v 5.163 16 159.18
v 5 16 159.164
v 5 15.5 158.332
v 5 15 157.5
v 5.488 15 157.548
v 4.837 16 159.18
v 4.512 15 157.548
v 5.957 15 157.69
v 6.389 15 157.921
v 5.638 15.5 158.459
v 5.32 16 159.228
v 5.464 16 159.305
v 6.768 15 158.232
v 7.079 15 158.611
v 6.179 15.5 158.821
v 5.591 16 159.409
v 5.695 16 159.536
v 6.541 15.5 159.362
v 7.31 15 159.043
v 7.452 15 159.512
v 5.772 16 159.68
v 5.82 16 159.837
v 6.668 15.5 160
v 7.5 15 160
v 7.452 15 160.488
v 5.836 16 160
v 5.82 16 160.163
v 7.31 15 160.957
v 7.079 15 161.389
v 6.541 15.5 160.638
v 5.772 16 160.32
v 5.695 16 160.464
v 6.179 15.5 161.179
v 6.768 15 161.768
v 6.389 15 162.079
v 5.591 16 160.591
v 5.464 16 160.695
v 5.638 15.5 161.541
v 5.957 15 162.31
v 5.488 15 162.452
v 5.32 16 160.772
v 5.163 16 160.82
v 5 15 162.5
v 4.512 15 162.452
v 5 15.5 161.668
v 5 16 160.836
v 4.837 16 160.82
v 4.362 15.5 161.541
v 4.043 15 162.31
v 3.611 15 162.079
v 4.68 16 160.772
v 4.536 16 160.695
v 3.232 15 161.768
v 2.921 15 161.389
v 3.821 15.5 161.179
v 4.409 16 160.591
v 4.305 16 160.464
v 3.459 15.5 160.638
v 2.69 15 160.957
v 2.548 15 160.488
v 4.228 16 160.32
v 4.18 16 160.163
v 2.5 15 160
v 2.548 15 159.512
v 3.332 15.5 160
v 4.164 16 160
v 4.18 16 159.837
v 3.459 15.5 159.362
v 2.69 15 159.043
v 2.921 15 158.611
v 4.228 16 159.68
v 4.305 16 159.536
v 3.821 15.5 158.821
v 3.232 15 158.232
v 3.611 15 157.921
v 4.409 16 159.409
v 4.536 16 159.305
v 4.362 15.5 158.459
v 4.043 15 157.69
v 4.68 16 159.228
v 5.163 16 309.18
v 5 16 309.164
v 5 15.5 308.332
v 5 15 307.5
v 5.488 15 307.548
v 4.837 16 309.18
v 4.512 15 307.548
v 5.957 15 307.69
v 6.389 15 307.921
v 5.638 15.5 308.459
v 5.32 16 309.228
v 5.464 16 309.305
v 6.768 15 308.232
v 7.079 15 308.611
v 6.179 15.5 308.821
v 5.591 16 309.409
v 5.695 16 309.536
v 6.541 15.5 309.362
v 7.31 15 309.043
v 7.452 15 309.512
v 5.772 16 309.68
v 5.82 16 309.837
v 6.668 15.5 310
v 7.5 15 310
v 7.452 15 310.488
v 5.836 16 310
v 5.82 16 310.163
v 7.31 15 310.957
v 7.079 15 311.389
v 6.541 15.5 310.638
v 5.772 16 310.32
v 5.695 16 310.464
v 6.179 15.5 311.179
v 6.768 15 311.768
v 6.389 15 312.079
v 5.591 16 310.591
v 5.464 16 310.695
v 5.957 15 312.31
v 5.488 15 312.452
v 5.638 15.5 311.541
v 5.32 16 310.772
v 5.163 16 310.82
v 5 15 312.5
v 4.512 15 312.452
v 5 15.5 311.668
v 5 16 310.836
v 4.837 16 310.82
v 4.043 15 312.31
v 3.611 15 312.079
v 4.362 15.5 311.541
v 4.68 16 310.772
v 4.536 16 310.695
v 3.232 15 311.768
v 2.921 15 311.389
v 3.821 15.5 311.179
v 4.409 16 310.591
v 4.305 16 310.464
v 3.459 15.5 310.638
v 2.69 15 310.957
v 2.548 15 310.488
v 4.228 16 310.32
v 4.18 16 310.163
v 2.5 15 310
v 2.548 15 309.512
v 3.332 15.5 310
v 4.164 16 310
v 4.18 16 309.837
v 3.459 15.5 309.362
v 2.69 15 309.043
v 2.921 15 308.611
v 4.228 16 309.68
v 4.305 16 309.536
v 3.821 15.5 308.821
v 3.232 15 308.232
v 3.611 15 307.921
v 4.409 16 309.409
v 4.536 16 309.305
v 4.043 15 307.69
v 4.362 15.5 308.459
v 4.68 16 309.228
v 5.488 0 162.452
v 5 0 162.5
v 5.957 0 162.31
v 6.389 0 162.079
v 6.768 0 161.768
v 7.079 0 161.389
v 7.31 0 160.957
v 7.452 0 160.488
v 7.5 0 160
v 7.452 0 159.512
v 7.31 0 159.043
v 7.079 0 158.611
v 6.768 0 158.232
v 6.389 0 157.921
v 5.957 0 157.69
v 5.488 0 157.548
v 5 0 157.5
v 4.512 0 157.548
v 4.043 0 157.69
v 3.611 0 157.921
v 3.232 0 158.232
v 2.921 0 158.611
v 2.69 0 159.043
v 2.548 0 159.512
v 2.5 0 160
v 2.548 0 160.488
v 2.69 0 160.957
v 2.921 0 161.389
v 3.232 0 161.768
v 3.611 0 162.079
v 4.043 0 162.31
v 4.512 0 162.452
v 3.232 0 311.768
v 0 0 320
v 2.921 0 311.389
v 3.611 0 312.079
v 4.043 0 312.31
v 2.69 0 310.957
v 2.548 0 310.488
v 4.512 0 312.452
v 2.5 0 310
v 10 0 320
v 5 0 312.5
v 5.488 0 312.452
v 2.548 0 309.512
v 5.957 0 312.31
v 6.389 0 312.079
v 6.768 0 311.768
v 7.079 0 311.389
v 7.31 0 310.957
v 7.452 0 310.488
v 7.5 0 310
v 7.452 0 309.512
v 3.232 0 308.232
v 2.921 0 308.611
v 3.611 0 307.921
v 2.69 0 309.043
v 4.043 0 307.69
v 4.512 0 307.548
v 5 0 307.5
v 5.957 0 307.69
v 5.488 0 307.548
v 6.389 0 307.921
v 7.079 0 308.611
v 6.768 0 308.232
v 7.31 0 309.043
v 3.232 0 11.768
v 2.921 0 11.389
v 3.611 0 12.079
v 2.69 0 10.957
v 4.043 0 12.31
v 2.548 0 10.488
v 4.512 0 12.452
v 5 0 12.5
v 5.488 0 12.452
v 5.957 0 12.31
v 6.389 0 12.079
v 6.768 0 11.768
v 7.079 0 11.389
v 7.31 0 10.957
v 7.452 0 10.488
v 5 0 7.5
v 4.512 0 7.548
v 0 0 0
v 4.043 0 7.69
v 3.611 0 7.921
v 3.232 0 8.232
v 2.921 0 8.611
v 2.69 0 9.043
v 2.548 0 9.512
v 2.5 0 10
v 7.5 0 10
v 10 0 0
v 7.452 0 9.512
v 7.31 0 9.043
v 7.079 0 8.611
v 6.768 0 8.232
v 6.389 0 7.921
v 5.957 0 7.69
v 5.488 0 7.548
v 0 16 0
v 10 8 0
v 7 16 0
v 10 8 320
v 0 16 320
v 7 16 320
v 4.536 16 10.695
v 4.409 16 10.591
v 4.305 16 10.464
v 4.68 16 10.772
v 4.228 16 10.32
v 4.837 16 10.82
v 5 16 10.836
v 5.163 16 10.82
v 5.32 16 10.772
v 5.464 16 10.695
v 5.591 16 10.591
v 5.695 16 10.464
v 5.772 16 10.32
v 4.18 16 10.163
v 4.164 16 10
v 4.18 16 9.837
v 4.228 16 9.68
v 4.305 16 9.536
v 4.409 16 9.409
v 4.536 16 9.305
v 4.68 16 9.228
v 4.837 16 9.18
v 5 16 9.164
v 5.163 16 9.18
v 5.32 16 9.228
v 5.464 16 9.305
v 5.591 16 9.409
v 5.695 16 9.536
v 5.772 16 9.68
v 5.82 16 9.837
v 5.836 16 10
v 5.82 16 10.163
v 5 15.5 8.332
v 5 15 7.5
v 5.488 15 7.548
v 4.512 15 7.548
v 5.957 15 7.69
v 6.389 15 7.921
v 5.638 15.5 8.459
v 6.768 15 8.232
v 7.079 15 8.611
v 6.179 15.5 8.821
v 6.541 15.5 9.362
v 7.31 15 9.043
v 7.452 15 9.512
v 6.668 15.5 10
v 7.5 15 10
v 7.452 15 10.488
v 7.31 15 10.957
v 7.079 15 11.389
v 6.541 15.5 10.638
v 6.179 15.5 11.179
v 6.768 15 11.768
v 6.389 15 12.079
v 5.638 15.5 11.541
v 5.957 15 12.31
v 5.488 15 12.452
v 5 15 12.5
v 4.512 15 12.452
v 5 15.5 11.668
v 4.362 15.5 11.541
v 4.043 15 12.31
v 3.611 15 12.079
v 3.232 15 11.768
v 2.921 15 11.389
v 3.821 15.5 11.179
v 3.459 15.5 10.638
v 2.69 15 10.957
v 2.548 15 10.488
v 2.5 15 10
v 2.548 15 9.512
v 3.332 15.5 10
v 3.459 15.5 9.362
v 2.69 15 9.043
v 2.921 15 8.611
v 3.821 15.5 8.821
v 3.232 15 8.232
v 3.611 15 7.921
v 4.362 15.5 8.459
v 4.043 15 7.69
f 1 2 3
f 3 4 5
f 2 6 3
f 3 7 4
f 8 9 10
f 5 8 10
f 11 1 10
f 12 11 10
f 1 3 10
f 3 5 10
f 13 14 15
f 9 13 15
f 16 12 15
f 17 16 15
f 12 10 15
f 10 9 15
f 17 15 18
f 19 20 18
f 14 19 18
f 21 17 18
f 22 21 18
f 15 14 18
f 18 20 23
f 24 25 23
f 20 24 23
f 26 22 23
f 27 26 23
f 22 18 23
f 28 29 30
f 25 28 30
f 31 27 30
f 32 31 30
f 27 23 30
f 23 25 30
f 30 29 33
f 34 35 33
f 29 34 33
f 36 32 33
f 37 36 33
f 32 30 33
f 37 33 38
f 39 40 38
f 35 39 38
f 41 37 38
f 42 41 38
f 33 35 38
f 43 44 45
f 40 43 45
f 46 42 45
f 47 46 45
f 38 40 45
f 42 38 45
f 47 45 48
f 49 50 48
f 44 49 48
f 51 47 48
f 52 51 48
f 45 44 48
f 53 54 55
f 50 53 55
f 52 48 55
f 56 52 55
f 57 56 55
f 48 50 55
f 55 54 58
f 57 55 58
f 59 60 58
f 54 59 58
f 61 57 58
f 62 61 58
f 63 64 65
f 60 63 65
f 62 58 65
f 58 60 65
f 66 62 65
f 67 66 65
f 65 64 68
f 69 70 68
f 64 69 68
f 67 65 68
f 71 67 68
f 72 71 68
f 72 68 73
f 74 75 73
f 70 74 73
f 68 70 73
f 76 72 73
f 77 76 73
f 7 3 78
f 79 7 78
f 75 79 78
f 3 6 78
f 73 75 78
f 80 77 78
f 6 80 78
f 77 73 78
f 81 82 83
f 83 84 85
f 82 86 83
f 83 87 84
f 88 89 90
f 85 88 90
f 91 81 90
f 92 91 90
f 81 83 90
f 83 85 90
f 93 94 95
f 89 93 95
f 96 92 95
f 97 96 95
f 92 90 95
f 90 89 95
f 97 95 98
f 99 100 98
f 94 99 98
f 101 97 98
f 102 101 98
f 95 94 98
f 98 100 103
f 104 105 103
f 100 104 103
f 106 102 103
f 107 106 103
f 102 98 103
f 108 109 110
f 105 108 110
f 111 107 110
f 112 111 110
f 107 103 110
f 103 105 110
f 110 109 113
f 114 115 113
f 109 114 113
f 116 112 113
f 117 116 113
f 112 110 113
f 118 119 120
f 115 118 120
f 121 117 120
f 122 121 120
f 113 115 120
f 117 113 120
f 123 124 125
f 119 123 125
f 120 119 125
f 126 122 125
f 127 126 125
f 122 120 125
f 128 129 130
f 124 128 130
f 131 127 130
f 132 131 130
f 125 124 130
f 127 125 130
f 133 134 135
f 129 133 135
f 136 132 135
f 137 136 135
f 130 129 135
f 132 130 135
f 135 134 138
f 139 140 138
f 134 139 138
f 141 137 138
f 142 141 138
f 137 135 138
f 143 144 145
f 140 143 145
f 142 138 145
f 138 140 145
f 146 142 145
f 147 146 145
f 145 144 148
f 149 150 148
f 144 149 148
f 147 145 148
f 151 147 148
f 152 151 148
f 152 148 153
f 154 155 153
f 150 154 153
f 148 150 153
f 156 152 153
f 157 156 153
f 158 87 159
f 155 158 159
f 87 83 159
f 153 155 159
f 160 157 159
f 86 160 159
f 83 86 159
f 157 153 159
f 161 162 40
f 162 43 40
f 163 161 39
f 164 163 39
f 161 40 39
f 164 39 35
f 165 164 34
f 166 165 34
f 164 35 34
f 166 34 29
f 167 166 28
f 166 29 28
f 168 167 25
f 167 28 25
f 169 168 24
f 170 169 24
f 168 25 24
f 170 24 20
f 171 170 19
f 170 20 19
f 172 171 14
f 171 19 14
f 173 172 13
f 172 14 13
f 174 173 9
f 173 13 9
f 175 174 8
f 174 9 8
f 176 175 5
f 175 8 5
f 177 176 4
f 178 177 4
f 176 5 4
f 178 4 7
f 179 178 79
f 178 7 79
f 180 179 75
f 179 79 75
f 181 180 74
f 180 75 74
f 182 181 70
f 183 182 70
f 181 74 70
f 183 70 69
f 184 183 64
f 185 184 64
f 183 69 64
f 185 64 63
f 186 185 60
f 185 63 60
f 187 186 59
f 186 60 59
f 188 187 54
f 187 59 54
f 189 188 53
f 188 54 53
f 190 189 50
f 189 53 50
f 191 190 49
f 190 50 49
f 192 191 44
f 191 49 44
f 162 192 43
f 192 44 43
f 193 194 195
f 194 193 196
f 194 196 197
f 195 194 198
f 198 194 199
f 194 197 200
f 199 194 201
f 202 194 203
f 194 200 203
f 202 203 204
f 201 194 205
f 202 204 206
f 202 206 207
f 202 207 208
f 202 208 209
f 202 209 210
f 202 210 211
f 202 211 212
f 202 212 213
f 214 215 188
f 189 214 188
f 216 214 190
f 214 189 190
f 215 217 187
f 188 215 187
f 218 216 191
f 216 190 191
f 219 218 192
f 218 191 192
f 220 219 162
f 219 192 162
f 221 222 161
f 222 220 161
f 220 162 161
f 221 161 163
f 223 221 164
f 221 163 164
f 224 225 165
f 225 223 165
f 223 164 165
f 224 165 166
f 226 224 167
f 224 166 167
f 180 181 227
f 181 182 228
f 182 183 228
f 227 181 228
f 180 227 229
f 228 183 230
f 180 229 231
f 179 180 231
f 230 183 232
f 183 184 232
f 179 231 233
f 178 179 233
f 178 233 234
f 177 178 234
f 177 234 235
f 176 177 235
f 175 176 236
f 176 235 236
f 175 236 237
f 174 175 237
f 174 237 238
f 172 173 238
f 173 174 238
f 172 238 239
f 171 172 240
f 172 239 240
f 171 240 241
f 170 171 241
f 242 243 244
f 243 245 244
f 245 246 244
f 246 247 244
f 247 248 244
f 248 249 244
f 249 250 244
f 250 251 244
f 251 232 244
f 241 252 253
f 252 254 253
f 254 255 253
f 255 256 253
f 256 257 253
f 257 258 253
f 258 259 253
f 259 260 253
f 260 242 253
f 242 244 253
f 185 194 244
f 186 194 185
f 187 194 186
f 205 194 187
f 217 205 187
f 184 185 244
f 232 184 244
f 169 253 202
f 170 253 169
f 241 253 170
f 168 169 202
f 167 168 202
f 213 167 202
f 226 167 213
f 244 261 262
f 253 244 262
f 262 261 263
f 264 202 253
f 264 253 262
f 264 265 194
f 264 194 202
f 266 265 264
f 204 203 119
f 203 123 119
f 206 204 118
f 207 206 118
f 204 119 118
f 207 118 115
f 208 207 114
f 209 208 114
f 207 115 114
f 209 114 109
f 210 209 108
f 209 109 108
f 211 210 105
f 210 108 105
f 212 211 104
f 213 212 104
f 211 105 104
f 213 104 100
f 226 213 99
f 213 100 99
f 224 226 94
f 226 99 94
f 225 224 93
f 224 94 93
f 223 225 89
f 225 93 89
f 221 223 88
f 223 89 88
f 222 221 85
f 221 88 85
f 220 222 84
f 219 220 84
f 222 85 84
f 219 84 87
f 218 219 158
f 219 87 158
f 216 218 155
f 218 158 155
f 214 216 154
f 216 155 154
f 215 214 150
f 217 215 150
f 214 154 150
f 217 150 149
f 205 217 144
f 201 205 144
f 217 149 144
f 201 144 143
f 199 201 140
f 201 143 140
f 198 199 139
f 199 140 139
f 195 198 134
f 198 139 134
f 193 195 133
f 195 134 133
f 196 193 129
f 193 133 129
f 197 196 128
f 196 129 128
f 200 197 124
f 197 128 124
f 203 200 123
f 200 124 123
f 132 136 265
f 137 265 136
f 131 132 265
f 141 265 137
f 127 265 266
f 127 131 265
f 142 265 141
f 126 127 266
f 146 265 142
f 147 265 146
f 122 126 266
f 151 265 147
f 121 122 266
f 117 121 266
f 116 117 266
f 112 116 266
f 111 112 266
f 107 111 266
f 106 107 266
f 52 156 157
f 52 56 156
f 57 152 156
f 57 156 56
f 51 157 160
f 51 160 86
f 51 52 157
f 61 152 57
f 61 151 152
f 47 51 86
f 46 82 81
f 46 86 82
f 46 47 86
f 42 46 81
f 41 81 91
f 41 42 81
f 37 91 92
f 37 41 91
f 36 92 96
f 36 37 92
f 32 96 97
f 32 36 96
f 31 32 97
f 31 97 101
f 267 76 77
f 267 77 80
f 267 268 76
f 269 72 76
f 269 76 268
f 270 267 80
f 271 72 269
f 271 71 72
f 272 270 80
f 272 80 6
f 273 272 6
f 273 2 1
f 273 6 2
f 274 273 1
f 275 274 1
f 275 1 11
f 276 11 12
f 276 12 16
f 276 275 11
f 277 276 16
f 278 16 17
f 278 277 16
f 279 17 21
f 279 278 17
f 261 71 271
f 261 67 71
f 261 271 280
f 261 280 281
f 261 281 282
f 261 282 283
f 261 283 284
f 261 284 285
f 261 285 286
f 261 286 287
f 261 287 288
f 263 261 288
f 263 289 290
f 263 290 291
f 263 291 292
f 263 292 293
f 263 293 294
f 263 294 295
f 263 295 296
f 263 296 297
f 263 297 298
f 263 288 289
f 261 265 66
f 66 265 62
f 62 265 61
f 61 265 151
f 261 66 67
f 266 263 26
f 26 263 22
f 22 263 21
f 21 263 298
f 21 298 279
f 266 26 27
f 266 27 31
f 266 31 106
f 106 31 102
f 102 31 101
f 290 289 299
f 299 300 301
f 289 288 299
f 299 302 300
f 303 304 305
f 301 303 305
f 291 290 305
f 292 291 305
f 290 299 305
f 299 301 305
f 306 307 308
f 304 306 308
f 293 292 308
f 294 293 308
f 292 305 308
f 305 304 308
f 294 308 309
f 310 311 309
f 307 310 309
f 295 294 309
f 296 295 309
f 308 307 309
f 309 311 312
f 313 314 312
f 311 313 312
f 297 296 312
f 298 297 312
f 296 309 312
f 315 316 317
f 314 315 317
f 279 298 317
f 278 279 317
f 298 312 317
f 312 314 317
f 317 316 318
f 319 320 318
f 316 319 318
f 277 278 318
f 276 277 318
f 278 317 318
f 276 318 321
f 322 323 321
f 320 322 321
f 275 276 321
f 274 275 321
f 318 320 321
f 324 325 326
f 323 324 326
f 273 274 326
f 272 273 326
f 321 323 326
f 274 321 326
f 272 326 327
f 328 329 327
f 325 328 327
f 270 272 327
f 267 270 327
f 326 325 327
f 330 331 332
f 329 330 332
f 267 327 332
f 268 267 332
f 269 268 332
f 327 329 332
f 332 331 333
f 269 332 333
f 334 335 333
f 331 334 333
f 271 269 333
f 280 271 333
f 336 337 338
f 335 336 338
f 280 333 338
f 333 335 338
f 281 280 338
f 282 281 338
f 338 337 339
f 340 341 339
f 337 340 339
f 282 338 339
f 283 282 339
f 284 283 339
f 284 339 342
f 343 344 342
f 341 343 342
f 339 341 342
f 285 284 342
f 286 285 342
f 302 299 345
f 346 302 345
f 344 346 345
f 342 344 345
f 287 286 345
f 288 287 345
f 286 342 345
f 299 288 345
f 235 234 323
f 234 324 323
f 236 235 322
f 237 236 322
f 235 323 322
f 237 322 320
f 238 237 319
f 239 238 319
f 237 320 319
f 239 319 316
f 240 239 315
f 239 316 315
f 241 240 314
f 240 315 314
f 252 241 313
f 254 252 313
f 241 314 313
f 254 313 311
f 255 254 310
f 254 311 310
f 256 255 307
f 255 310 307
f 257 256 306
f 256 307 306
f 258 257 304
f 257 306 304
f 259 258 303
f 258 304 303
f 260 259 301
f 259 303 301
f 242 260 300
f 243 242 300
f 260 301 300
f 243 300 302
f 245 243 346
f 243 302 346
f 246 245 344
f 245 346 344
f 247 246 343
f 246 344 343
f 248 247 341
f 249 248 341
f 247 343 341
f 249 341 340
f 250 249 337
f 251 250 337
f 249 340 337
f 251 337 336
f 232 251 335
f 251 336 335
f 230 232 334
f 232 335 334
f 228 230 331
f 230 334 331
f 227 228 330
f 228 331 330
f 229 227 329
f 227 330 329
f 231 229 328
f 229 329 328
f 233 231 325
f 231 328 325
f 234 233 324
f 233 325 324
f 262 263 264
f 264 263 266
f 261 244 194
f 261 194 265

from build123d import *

# Parameters (mm, degrees)
SKETCH_1_W             = 10
SKETCH_1_H             = 16
EXTRUDE_1_DEPTH        = 320
HOLE_WIZARD_M6_1_D     = 5
HOLE_WIZARD_M6_1_DEPTH = 15
HOLE_WIZARD_M6_1_TIP   = 1.502151548
CHAMFER_1_SIZE         = 8
CHAMFER_1_SIZE2        = 3


with BuildPart() as part:
    # 草图1 → 凸台-拉伸1 (new body)
    with BuildSketch(Plane.XY):
        with Locations((5, 8)):
            Rectangle(SKETCH_1_W, SKETCH_1_H)
    extrude(amount=EXTRUDE_1_DEPTH)

    # M6 螺纹孔1
    with Locations(Plane(origin=(5, 0, 310), x_dir=(0, 0, -1), z_dir=(0, -1, 0))):
        with Locations((0, 0), (150, 0), (300, 0)):
            Hole(HOLE_WIZARD_M6_1_D / 2, depth=HOLE_WIZARD_M6_1_DEPTH)
            with Locations((0, 0, -(HOLE_WIZARD_M6_1_DEPTH + HOLE_WIZARD_M6_1_TIP / 2))):  # 118° drill point
                Cone(0, HOLE_WIZARD_M6_1_D / 2, HOLE_WIZARD_M6_1_TIP, mode=Mode.SUBTRACT)

    # 倒角1
    chamfer_1_edges = [part.edges().sort_by_distance(p)[0] for p in [
        (10, 16, 160),
    ]]
    chamfer_1_side = [part.faces().sort_by_distance(p)[0] for p in [
        (10, 8, 160),
    ]]
    chamfer(chamfer_1_edges, length=CHAMFER_1_SIZE, length2=CHAMFER_1_SIZE2, reference=chamfer_1_side[0])


solid = part.part
